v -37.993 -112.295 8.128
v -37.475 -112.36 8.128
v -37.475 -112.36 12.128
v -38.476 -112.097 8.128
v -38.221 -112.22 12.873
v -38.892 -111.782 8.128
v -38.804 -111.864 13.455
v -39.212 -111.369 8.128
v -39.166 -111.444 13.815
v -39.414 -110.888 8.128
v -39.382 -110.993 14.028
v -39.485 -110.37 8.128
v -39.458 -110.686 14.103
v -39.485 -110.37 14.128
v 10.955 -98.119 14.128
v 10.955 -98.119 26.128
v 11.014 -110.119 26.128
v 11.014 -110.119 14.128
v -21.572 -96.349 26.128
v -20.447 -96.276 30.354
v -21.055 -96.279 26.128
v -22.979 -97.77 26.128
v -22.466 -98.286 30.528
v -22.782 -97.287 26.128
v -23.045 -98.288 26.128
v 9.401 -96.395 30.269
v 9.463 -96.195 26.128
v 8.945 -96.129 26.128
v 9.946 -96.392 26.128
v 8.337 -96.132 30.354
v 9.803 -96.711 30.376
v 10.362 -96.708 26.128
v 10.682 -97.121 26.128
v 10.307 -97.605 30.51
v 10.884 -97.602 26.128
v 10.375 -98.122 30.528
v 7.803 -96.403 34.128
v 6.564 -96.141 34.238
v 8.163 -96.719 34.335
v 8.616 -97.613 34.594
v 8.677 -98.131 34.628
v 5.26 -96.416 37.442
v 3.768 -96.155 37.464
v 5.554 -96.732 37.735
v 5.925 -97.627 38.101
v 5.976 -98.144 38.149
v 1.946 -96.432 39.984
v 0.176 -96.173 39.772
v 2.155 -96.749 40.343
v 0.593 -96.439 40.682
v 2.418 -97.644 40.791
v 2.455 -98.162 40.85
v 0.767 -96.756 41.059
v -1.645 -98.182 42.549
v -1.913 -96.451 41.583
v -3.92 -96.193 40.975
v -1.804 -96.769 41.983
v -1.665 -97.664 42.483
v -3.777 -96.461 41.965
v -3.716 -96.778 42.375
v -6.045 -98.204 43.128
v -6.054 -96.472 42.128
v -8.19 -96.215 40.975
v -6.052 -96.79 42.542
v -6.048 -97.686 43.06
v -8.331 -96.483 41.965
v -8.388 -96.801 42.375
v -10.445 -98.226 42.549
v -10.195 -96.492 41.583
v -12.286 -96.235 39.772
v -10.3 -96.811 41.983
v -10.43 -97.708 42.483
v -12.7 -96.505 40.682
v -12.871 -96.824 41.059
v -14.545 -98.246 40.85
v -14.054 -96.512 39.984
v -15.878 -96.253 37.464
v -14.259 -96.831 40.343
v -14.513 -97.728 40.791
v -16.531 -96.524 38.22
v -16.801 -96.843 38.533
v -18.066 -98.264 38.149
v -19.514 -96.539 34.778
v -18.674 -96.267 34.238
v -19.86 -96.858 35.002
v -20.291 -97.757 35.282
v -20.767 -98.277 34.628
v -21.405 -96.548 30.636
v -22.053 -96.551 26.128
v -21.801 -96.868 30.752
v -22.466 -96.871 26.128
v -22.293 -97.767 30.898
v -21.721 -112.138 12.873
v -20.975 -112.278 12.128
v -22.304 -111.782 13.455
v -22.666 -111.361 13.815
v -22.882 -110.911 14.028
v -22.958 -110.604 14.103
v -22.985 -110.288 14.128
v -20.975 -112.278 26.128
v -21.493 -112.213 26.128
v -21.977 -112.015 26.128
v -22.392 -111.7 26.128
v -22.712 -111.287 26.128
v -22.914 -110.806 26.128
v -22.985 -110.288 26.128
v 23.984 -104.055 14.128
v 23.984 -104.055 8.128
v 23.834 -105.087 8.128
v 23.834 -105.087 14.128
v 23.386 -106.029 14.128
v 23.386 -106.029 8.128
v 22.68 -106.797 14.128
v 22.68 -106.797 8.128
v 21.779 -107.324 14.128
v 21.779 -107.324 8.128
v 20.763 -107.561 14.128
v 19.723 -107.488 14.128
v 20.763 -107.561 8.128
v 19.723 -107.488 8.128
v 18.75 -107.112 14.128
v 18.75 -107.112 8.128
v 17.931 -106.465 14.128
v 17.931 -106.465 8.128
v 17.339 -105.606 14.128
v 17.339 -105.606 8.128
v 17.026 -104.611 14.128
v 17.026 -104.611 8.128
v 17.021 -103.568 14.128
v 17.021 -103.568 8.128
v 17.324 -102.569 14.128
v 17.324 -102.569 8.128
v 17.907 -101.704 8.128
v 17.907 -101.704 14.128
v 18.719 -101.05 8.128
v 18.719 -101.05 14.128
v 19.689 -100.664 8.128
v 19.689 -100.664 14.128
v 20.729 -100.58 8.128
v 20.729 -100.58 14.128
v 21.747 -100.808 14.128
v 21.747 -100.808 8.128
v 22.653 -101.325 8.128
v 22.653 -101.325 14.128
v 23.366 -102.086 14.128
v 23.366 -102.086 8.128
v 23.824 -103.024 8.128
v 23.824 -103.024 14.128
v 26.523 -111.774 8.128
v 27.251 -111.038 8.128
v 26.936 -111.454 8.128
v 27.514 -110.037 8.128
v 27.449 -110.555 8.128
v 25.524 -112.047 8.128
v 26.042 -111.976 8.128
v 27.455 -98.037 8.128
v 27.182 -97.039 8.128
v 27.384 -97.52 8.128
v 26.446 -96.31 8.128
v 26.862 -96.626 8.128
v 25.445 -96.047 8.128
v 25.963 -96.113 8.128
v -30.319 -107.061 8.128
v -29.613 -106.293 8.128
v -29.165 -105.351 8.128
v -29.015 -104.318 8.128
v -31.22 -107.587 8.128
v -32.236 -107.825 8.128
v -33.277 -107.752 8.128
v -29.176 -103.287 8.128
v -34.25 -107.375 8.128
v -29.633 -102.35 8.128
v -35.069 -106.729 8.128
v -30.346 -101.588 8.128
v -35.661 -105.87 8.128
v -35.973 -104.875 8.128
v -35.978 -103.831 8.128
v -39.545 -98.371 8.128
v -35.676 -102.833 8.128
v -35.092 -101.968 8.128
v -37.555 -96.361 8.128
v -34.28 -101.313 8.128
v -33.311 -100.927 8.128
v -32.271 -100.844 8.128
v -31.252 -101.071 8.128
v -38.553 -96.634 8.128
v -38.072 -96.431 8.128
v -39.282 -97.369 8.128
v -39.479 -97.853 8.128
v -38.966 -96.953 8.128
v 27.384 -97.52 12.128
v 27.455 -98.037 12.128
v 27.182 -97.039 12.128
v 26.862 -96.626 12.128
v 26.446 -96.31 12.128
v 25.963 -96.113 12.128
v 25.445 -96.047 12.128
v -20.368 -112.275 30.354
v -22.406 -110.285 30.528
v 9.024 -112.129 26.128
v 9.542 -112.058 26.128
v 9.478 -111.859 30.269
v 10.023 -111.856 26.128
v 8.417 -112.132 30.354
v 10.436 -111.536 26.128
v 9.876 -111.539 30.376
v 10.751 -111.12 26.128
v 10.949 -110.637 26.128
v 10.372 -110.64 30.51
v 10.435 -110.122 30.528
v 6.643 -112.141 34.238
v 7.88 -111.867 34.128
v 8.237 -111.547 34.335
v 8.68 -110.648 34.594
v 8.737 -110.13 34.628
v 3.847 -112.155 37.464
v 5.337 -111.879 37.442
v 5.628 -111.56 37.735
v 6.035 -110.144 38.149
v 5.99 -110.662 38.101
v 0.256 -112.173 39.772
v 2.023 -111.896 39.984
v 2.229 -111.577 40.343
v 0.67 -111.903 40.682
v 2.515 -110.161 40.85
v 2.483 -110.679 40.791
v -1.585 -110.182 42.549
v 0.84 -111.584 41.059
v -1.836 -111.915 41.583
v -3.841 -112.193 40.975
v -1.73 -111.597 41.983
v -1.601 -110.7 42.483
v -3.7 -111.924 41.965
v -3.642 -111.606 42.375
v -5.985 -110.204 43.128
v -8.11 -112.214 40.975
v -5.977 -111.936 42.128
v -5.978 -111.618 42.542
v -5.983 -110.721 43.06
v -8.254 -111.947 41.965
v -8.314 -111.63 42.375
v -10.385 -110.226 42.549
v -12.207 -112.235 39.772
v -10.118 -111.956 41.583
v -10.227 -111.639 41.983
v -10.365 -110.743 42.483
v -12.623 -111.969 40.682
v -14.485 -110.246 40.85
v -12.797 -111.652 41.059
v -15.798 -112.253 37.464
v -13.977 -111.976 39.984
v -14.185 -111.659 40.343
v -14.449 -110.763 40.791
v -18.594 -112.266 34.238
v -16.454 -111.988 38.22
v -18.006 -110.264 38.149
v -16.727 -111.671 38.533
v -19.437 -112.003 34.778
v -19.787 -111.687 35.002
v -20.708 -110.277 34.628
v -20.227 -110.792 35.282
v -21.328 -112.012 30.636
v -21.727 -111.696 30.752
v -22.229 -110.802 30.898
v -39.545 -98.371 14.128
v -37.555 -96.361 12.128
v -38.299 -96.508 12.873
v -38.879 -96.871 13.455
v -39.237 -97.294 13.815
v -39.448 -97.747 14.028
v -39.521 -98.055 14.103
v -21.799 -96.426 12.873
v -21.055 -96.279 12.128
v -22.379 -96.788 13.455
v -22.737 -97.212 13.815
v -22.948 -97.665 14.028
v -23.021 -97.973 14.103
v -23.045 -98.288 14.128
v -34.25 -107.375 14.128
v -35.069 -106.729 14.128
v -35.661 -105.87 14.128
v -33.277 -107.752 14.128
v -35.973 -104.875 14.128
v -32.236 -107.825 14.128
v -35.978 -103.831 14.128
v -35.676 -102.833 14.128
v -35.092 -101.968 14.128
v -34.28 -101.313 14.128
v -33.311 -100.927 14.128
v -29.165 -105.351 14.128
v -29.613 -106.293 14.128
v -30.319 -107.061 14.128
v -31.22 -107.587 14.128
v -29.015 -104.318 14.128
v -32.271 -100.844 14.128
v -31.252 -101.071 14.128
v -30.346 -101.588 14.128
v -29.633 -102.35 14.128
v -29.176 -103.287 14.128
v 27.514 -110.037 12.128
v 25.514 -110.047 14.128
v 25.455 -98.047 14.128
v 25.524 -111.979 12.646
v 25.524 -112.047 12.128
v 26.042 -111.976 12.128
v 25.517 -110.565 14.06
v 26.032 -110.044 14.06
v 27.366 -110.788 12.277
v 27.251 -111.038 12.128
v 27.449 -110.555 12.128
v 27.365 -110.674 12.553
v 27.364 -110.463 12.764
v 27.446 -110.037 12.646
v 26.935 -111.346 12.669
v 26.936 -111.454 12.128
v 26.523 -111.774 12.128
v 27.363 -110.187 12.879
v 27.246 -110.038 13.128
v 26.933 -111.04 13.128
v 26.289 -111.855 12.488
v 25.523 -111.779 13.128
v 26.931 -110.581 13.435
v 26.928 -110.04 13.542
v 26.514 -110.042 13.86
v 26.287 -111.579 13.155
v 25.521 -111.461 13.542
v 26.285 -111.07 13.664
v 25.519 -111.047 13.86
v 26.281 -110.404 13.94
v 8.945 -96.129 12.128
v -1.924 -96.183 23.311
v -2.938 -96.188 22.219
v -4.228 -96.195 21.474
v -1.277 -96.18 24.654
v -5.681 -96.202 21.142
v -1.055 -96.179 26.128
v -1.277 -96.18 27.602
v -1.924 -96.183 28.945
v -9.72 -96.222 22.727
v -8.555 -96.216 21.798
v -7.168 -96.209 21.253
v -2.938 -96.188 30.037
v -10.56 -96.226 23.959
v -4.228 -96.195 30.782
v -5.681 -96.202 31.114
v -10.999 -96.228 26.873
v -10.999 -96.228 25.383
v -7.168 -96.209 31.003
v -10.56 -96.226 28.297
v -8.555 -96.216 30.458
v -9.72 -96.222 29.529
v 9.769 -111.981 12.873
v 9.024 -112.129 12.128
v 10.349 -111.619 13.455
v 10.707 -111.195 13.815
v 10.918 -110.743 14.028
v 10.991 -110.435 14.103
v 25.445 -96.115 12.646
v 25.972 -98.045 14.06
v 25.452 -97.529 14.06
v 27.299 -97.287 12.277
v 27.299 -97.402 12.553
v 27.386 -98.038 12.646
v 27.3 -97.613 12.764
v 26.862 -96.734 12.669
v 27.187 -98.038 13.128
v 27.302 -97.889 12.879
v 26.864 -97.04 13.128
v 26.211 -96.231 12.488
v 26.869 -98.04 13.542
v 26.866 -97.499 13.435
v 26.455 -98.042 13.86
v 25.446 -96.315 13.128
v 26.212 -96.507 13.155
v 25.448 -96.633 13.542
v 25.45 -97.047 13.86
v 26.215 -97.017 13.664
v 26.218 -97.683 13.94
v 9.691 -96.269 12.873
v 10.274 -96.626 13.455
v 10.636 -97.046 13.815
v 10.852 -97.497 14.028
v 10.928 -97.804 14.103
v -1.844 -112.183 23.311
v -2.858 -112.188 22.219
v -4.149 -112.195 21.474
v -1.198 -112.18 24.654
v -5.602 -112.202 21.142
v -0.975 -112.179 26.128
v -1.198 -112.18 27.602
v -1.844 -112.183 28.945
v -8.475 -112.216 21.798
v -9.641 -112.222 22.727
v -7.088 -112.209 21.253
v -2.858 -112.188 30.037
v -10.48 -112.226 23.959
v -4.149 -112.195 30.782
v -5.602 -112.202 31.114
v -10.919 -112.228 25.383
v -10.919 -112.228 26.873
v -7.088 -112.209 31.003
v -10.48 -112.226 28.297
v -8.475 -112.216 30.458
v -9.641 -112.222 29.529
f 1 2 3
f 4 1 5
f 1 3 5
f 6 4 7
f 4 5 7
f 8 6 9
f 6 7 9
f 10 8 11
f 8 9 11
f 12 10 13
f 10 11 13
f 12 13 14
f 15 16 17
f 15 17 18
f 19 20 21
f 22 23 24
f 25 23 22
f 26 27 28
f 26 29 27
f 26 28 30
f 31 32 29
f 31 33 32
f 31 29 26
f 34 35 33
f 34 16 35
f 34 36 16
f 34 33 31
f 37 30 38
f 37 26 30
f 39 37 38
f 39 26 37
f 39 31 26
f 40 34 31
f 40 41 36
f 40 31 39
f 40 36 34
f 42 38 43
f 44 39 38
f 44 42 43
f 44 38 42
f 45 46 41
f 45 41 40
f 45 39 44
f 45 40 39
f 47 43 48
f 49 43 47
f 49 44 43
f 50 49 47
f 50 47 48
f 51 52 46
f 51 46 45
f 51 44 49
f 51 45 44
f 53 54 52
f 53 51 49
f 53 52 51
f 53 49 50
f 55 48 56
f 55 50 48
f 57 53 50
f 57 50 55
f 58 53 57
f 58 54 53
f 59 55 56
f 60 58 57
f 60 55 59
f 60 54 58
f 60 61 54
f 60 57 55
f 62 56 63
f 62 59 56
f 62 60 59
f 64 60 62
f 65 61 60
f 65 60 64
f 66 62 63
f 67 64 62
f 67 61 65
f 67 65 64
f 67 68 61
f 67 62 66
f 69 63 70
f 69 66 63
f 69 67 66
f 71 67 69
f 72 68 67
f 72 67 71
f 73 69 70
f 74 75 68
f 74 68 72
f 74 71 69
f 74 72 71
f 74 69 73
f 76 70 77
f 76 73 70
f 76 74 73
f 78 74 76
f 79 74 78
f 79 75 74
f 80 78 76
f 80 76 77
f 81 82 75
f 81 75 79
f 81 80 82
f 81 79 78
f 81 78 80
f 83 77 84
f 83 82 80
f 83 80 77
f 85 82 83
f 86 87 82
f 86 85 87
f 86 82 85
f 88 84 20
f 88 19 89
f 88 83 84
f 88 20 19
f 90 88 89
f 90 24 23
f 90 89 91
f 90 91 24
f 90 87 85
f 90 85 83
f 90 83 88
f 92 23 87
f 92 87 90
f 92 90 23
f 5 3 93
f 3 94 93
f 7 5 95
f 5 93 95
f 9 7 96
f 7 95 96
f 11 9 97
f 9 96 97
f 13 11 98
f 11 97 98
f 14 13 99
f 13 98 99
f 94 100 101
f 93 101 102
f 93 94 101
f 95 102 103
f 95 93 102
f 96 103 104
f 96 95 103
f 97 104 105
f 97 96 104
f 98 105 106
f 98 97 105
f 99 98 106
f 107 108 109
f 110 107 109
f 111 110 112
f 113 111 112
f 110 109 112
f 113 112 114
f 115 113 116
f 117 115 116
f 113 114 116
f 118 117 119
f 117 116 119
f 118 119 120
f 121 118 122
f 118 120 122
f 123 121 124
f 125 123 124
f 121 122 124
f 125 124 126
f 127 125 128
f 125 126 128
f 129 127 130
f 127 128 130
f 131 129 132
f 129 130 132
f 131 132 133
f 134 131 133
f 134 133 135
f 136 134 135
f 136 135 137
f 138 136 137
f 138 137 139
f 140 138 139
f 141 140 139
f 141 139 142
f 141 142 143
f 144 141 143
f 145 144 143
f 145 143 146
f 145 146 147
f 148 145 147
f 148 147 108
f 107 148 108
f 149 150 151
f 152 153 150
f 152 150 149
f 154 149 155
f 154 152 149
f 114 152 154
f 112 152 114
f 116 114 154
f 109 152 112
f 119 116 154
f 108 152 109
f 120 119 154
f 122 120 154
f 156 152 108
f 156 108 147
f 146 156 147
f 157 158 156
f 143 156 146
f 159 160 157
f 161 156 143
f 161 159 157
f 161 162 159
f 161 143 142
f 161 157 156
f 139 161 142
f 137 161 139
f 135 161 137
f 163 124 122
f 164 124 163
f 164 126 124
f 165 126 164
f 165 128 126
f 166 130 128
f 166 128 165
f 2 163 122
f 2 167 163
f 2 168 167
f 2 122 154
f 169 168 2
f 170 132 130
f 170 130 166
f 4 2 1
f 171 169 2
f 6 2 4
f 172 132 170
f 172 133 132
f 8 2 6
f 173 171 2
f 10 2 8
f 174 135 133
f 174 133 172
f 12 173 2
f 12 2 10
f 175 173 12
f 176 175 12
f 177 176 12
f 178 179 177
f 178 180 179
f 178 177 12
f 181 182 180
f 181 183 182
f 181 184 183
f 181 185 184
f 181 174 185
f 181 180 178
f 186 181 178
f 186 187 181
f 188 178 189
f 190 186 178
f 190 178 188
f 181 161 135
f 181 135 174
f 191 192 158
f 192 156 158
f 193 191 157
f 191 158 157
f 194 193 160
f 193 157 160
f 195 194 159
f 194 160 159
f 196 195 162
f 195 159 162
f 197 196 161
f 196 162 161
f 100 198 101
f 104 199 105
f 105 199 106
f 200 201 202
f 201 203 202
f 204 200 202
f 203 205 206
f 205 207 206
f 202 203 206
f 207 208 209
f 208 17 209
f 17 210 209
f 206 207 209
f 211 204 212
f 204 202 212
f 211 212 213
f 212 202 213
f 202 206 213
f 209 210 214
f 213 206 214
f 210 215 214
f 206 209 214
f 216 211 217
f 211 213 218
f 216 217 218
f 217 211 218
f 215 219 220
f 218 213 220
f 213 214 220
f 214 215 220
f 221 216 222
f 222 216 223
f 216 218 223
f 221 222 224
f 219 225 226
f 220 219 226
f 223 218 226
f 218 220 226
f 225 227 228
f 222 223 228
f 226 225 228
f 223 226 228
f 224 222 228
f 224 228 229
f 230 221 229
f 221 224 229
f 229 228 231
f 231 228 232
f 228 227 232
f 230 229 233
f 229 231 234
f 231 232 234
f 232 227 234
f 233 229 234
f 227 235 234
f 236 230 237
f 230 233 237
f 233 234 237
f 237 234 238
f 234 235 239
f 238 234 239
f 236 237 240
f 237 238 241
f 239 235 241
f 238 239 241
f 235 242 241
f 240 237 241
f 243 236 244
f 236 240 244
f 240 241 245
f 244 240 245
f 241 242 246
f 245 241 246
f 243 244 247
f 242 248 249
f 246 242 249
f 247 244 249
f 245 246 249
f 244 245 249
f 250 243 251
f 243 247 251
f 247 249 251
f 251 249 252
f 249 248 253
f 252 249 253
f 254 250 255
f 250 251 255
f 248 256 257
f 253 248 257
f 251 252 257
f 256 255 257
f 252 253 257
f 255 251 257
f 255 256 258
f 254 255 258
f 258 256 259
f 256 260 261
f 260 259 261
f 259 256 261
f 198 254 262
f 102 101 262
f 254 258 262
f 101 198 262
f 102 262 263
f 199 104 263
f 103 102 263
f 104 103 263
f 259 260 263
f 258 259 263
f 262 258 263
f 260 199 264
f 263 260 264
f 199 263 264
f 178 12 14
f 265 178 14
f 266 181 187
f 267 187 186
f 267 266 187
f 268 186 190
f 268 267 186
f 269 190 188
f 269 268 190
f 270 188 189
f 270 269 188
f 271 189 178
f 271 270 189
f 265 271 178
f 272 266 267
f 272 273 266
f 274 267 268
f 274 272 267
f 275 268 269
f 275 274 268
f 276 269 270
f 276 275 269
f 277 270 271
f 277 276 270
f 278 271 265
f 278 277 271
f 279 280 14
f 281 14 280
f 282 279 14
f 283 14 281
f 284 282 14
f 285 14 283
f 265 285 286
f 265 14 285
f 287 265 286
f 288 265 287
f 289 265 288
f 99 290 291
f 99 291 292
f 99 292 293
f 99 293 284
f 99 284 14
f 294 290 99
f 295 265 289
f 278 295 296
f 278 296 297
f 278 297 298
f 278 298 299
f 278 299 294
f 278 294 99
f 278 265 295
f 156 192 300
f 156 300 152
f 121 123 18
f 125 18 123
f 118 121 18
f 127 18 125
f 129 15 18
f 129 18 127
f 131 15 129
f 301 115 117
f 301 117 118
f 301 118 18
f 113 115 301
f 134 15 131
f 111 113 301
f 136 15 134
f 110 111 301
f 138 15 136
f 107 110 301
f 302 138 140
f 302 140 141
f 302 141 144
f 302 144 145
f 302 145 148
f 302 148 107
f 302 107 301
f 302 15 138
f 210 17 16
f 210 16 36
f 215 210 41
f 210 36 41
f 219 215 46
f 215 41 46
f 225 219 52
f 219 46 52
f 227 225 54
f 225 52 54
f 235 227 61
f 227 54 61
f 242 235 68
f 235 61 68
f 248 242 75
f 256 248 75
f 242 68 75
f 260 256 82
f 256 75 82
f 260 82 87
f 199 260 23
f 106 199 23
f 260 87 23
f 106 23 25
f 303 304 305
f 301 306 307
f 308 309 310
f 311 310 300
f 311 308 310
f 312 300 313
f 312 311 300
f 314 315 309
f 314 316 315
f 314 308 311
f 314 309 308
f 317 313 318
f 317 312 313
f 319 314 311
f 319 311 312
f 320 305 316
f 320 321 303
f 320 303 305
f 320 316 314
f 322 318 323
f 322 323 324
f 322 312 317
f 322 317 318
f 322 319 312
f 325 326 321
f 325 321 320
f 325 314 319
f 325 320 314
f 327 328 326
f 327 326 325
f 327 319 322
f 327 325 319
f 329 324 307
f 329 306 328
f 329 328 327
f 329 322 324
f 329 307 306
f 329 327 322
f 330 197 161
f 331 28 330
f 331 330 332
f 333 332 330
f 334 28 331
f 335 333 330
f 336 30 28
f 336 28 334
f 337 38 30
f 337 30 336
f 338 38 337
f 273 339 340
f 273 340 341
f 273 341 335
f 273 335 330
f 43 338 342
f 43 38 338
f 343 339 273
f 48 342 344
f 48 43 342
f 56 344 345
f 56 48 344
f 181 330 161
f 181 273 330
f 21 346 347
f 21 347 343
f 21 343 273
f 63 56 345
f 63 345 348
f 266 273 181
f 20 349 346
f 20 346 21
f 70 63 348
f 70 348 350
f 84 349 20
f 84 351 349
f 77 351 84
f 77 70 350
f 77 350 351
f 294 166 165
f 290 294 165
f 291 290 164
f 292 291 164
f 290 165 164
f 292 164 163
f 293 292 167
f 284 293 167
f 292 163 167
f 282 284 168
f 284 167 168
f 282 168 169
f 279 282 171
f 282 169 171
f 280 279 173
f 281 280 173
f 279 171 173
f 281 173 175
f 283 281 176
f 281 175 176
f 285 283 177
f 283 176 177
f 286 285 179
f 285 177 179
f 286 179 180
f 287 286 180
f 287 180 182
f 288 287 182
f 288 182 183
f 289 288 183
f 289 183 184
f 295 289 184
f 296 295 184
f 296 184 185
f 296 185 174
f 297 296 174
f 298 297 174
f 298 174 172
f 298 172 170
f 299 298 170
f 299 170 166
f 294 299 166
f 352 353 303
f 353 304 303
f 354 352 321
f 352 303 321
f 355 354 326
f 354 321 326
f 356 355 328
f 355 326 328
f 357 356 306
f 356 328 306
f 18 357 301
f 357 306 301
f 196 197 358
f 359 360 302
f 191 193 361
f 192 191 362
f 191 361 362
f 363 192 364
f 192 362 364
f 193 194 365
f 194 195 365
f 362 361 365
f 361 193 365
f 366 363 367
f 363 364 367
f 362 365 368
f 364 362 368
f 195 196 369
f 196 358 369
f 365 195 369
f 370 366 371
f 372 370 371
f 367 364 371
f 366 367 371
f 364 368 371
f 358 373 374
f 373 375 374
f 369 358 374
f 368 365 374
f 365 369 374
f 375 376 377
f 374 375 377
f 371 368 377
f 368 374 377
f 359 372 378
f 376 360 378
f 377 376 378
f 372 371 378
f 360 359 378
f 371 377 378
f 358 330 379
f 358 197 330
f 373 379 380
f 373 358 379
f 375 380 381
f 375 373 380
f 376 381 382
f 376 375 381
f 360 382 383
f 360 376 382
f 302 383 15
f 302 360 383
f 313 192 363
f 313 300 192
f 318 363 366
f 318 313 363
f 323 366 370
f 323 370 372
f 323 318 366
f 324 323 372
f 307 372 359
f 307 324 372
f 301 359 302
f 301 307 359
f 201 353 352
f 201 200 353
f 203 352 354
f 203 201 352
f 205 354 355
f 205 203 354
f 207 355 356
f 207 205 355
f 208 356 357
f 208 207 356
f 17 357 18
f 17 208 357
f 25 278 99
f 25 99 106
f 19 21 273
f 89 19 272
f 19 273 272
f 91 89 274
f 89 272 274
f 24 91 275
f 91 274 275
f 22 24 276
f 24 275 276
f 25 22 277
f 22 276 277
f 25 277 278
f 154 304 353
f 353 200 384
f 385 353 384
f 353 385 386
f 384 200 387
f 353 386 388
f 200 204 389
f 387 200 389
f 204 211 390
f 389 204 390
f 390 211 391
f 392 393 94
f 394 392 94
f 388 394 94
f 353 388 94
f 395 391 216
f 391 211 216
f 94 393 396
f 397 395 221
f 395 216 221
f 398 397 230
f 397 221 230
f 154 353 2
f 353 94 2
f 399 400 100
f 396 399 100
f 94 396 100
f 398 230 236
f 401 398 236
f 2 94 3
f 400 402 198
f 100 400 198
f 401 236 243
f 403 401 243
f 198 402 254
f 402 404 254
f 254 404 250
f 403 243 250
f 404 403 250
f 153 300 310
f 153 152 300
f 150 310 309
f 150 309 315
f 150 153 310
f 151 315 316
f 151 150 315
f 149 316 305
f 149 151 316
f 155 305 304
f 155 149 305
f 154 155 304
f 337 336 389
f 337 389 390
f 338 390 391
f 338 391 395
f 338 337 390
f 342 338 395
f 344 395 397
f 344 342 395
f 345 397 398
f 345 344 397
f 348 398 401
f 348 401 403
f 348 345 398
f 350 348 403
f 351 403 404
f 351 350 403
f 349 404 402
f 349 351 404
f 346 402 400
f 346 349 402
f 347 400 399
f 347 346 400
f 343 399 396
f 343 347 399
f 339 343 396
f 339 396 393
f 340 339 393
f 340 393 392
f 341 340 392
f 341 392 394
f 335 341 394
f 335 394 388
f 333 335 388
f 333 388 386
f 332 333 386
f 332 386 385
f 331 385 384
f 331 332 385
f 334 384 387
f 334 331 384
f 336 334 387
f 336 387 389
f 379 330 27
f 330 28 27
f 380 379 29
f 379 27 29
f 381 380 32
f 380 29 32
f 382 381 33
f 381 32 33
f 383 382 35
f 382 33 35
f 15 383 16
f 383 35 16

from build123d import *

# Parameters (mm, degrees)
SKETCH012_R             = 5
PAD004_DEPTH            = 16
SKETCH013_R             = 3.5
POCKET_DEPTH            = 35.001
FILLET_R                = 2
BODY003_PLACEMENT_ANGLE = 0.285111


with BuildPart() as part:
    # Sketch012 → Pad004 (new body)
    with BuildSketch(Plane.XZ):
        with BuildLine():
            Line((33.5, -18), (-33.5, -18))
            Line((-33.5, -18), (-33.5, -12))
            Line((-33.5, -12), (-17, -12))
            Line((-17, -12), (-17, 0))
            ThreePointArc((17, 0), (0, 17), (-17, 0))
            Line((17, 0), (17, -12))
            Line((17, -12), (33.5, -12))
            Line((33.5, -12), (33.5, -18))
        make_face()
        Circle(SKETCH012_R, mode=Mode.SUBTRACT)
    extrude(amount=PAD004_DEPTH)

    # Sketch013 (on Face4 of Pad004) → Pocket (cut, through all)
    with BuildSketch(Plane(origin=(0, 0, -18), x_dir=(1, 0, 0), z_dir=(0, 0, -1))):
        with Locations((-26.5, 8)):
            Circle(SKETCH013_R)
        with Locations((26.5, 8)):
            Circle(SKETCH013_R)
    extrude(amount=-POCKET_DEPTH, mode=Mode.SUBTRACT)

    # Fillet
    fillet_edges = [part.edges().sort_by_distance(p)[0] for p in [
        (0, -16, 17),
        (0, 0, 17),
        (-25.25, 0, -12),
        (-25.25, -16, -12),
        (-33.5, -16, -15),
        (-33.5, 0, -15),
        (25.25, -16, -12),
        (25.25, 0, -12),
        (33.5, 0, -15),
        (33.5, -16, -15),
        (33.5, -8, -12),
    ]]
    fillet(fillet_edges, radius=FILLET_R)


with BuildPart() as part_1:
    # Body003 placement: moved
    add(part.part.moved(Location((-6.054991, -96.20389, 26.128014))).rotate(Axis((-6.054991, -96.20389, 26.128014), (0, 0, 1)), BODY003_PLACEMENT_ANGLE))


solid = part_1.part
